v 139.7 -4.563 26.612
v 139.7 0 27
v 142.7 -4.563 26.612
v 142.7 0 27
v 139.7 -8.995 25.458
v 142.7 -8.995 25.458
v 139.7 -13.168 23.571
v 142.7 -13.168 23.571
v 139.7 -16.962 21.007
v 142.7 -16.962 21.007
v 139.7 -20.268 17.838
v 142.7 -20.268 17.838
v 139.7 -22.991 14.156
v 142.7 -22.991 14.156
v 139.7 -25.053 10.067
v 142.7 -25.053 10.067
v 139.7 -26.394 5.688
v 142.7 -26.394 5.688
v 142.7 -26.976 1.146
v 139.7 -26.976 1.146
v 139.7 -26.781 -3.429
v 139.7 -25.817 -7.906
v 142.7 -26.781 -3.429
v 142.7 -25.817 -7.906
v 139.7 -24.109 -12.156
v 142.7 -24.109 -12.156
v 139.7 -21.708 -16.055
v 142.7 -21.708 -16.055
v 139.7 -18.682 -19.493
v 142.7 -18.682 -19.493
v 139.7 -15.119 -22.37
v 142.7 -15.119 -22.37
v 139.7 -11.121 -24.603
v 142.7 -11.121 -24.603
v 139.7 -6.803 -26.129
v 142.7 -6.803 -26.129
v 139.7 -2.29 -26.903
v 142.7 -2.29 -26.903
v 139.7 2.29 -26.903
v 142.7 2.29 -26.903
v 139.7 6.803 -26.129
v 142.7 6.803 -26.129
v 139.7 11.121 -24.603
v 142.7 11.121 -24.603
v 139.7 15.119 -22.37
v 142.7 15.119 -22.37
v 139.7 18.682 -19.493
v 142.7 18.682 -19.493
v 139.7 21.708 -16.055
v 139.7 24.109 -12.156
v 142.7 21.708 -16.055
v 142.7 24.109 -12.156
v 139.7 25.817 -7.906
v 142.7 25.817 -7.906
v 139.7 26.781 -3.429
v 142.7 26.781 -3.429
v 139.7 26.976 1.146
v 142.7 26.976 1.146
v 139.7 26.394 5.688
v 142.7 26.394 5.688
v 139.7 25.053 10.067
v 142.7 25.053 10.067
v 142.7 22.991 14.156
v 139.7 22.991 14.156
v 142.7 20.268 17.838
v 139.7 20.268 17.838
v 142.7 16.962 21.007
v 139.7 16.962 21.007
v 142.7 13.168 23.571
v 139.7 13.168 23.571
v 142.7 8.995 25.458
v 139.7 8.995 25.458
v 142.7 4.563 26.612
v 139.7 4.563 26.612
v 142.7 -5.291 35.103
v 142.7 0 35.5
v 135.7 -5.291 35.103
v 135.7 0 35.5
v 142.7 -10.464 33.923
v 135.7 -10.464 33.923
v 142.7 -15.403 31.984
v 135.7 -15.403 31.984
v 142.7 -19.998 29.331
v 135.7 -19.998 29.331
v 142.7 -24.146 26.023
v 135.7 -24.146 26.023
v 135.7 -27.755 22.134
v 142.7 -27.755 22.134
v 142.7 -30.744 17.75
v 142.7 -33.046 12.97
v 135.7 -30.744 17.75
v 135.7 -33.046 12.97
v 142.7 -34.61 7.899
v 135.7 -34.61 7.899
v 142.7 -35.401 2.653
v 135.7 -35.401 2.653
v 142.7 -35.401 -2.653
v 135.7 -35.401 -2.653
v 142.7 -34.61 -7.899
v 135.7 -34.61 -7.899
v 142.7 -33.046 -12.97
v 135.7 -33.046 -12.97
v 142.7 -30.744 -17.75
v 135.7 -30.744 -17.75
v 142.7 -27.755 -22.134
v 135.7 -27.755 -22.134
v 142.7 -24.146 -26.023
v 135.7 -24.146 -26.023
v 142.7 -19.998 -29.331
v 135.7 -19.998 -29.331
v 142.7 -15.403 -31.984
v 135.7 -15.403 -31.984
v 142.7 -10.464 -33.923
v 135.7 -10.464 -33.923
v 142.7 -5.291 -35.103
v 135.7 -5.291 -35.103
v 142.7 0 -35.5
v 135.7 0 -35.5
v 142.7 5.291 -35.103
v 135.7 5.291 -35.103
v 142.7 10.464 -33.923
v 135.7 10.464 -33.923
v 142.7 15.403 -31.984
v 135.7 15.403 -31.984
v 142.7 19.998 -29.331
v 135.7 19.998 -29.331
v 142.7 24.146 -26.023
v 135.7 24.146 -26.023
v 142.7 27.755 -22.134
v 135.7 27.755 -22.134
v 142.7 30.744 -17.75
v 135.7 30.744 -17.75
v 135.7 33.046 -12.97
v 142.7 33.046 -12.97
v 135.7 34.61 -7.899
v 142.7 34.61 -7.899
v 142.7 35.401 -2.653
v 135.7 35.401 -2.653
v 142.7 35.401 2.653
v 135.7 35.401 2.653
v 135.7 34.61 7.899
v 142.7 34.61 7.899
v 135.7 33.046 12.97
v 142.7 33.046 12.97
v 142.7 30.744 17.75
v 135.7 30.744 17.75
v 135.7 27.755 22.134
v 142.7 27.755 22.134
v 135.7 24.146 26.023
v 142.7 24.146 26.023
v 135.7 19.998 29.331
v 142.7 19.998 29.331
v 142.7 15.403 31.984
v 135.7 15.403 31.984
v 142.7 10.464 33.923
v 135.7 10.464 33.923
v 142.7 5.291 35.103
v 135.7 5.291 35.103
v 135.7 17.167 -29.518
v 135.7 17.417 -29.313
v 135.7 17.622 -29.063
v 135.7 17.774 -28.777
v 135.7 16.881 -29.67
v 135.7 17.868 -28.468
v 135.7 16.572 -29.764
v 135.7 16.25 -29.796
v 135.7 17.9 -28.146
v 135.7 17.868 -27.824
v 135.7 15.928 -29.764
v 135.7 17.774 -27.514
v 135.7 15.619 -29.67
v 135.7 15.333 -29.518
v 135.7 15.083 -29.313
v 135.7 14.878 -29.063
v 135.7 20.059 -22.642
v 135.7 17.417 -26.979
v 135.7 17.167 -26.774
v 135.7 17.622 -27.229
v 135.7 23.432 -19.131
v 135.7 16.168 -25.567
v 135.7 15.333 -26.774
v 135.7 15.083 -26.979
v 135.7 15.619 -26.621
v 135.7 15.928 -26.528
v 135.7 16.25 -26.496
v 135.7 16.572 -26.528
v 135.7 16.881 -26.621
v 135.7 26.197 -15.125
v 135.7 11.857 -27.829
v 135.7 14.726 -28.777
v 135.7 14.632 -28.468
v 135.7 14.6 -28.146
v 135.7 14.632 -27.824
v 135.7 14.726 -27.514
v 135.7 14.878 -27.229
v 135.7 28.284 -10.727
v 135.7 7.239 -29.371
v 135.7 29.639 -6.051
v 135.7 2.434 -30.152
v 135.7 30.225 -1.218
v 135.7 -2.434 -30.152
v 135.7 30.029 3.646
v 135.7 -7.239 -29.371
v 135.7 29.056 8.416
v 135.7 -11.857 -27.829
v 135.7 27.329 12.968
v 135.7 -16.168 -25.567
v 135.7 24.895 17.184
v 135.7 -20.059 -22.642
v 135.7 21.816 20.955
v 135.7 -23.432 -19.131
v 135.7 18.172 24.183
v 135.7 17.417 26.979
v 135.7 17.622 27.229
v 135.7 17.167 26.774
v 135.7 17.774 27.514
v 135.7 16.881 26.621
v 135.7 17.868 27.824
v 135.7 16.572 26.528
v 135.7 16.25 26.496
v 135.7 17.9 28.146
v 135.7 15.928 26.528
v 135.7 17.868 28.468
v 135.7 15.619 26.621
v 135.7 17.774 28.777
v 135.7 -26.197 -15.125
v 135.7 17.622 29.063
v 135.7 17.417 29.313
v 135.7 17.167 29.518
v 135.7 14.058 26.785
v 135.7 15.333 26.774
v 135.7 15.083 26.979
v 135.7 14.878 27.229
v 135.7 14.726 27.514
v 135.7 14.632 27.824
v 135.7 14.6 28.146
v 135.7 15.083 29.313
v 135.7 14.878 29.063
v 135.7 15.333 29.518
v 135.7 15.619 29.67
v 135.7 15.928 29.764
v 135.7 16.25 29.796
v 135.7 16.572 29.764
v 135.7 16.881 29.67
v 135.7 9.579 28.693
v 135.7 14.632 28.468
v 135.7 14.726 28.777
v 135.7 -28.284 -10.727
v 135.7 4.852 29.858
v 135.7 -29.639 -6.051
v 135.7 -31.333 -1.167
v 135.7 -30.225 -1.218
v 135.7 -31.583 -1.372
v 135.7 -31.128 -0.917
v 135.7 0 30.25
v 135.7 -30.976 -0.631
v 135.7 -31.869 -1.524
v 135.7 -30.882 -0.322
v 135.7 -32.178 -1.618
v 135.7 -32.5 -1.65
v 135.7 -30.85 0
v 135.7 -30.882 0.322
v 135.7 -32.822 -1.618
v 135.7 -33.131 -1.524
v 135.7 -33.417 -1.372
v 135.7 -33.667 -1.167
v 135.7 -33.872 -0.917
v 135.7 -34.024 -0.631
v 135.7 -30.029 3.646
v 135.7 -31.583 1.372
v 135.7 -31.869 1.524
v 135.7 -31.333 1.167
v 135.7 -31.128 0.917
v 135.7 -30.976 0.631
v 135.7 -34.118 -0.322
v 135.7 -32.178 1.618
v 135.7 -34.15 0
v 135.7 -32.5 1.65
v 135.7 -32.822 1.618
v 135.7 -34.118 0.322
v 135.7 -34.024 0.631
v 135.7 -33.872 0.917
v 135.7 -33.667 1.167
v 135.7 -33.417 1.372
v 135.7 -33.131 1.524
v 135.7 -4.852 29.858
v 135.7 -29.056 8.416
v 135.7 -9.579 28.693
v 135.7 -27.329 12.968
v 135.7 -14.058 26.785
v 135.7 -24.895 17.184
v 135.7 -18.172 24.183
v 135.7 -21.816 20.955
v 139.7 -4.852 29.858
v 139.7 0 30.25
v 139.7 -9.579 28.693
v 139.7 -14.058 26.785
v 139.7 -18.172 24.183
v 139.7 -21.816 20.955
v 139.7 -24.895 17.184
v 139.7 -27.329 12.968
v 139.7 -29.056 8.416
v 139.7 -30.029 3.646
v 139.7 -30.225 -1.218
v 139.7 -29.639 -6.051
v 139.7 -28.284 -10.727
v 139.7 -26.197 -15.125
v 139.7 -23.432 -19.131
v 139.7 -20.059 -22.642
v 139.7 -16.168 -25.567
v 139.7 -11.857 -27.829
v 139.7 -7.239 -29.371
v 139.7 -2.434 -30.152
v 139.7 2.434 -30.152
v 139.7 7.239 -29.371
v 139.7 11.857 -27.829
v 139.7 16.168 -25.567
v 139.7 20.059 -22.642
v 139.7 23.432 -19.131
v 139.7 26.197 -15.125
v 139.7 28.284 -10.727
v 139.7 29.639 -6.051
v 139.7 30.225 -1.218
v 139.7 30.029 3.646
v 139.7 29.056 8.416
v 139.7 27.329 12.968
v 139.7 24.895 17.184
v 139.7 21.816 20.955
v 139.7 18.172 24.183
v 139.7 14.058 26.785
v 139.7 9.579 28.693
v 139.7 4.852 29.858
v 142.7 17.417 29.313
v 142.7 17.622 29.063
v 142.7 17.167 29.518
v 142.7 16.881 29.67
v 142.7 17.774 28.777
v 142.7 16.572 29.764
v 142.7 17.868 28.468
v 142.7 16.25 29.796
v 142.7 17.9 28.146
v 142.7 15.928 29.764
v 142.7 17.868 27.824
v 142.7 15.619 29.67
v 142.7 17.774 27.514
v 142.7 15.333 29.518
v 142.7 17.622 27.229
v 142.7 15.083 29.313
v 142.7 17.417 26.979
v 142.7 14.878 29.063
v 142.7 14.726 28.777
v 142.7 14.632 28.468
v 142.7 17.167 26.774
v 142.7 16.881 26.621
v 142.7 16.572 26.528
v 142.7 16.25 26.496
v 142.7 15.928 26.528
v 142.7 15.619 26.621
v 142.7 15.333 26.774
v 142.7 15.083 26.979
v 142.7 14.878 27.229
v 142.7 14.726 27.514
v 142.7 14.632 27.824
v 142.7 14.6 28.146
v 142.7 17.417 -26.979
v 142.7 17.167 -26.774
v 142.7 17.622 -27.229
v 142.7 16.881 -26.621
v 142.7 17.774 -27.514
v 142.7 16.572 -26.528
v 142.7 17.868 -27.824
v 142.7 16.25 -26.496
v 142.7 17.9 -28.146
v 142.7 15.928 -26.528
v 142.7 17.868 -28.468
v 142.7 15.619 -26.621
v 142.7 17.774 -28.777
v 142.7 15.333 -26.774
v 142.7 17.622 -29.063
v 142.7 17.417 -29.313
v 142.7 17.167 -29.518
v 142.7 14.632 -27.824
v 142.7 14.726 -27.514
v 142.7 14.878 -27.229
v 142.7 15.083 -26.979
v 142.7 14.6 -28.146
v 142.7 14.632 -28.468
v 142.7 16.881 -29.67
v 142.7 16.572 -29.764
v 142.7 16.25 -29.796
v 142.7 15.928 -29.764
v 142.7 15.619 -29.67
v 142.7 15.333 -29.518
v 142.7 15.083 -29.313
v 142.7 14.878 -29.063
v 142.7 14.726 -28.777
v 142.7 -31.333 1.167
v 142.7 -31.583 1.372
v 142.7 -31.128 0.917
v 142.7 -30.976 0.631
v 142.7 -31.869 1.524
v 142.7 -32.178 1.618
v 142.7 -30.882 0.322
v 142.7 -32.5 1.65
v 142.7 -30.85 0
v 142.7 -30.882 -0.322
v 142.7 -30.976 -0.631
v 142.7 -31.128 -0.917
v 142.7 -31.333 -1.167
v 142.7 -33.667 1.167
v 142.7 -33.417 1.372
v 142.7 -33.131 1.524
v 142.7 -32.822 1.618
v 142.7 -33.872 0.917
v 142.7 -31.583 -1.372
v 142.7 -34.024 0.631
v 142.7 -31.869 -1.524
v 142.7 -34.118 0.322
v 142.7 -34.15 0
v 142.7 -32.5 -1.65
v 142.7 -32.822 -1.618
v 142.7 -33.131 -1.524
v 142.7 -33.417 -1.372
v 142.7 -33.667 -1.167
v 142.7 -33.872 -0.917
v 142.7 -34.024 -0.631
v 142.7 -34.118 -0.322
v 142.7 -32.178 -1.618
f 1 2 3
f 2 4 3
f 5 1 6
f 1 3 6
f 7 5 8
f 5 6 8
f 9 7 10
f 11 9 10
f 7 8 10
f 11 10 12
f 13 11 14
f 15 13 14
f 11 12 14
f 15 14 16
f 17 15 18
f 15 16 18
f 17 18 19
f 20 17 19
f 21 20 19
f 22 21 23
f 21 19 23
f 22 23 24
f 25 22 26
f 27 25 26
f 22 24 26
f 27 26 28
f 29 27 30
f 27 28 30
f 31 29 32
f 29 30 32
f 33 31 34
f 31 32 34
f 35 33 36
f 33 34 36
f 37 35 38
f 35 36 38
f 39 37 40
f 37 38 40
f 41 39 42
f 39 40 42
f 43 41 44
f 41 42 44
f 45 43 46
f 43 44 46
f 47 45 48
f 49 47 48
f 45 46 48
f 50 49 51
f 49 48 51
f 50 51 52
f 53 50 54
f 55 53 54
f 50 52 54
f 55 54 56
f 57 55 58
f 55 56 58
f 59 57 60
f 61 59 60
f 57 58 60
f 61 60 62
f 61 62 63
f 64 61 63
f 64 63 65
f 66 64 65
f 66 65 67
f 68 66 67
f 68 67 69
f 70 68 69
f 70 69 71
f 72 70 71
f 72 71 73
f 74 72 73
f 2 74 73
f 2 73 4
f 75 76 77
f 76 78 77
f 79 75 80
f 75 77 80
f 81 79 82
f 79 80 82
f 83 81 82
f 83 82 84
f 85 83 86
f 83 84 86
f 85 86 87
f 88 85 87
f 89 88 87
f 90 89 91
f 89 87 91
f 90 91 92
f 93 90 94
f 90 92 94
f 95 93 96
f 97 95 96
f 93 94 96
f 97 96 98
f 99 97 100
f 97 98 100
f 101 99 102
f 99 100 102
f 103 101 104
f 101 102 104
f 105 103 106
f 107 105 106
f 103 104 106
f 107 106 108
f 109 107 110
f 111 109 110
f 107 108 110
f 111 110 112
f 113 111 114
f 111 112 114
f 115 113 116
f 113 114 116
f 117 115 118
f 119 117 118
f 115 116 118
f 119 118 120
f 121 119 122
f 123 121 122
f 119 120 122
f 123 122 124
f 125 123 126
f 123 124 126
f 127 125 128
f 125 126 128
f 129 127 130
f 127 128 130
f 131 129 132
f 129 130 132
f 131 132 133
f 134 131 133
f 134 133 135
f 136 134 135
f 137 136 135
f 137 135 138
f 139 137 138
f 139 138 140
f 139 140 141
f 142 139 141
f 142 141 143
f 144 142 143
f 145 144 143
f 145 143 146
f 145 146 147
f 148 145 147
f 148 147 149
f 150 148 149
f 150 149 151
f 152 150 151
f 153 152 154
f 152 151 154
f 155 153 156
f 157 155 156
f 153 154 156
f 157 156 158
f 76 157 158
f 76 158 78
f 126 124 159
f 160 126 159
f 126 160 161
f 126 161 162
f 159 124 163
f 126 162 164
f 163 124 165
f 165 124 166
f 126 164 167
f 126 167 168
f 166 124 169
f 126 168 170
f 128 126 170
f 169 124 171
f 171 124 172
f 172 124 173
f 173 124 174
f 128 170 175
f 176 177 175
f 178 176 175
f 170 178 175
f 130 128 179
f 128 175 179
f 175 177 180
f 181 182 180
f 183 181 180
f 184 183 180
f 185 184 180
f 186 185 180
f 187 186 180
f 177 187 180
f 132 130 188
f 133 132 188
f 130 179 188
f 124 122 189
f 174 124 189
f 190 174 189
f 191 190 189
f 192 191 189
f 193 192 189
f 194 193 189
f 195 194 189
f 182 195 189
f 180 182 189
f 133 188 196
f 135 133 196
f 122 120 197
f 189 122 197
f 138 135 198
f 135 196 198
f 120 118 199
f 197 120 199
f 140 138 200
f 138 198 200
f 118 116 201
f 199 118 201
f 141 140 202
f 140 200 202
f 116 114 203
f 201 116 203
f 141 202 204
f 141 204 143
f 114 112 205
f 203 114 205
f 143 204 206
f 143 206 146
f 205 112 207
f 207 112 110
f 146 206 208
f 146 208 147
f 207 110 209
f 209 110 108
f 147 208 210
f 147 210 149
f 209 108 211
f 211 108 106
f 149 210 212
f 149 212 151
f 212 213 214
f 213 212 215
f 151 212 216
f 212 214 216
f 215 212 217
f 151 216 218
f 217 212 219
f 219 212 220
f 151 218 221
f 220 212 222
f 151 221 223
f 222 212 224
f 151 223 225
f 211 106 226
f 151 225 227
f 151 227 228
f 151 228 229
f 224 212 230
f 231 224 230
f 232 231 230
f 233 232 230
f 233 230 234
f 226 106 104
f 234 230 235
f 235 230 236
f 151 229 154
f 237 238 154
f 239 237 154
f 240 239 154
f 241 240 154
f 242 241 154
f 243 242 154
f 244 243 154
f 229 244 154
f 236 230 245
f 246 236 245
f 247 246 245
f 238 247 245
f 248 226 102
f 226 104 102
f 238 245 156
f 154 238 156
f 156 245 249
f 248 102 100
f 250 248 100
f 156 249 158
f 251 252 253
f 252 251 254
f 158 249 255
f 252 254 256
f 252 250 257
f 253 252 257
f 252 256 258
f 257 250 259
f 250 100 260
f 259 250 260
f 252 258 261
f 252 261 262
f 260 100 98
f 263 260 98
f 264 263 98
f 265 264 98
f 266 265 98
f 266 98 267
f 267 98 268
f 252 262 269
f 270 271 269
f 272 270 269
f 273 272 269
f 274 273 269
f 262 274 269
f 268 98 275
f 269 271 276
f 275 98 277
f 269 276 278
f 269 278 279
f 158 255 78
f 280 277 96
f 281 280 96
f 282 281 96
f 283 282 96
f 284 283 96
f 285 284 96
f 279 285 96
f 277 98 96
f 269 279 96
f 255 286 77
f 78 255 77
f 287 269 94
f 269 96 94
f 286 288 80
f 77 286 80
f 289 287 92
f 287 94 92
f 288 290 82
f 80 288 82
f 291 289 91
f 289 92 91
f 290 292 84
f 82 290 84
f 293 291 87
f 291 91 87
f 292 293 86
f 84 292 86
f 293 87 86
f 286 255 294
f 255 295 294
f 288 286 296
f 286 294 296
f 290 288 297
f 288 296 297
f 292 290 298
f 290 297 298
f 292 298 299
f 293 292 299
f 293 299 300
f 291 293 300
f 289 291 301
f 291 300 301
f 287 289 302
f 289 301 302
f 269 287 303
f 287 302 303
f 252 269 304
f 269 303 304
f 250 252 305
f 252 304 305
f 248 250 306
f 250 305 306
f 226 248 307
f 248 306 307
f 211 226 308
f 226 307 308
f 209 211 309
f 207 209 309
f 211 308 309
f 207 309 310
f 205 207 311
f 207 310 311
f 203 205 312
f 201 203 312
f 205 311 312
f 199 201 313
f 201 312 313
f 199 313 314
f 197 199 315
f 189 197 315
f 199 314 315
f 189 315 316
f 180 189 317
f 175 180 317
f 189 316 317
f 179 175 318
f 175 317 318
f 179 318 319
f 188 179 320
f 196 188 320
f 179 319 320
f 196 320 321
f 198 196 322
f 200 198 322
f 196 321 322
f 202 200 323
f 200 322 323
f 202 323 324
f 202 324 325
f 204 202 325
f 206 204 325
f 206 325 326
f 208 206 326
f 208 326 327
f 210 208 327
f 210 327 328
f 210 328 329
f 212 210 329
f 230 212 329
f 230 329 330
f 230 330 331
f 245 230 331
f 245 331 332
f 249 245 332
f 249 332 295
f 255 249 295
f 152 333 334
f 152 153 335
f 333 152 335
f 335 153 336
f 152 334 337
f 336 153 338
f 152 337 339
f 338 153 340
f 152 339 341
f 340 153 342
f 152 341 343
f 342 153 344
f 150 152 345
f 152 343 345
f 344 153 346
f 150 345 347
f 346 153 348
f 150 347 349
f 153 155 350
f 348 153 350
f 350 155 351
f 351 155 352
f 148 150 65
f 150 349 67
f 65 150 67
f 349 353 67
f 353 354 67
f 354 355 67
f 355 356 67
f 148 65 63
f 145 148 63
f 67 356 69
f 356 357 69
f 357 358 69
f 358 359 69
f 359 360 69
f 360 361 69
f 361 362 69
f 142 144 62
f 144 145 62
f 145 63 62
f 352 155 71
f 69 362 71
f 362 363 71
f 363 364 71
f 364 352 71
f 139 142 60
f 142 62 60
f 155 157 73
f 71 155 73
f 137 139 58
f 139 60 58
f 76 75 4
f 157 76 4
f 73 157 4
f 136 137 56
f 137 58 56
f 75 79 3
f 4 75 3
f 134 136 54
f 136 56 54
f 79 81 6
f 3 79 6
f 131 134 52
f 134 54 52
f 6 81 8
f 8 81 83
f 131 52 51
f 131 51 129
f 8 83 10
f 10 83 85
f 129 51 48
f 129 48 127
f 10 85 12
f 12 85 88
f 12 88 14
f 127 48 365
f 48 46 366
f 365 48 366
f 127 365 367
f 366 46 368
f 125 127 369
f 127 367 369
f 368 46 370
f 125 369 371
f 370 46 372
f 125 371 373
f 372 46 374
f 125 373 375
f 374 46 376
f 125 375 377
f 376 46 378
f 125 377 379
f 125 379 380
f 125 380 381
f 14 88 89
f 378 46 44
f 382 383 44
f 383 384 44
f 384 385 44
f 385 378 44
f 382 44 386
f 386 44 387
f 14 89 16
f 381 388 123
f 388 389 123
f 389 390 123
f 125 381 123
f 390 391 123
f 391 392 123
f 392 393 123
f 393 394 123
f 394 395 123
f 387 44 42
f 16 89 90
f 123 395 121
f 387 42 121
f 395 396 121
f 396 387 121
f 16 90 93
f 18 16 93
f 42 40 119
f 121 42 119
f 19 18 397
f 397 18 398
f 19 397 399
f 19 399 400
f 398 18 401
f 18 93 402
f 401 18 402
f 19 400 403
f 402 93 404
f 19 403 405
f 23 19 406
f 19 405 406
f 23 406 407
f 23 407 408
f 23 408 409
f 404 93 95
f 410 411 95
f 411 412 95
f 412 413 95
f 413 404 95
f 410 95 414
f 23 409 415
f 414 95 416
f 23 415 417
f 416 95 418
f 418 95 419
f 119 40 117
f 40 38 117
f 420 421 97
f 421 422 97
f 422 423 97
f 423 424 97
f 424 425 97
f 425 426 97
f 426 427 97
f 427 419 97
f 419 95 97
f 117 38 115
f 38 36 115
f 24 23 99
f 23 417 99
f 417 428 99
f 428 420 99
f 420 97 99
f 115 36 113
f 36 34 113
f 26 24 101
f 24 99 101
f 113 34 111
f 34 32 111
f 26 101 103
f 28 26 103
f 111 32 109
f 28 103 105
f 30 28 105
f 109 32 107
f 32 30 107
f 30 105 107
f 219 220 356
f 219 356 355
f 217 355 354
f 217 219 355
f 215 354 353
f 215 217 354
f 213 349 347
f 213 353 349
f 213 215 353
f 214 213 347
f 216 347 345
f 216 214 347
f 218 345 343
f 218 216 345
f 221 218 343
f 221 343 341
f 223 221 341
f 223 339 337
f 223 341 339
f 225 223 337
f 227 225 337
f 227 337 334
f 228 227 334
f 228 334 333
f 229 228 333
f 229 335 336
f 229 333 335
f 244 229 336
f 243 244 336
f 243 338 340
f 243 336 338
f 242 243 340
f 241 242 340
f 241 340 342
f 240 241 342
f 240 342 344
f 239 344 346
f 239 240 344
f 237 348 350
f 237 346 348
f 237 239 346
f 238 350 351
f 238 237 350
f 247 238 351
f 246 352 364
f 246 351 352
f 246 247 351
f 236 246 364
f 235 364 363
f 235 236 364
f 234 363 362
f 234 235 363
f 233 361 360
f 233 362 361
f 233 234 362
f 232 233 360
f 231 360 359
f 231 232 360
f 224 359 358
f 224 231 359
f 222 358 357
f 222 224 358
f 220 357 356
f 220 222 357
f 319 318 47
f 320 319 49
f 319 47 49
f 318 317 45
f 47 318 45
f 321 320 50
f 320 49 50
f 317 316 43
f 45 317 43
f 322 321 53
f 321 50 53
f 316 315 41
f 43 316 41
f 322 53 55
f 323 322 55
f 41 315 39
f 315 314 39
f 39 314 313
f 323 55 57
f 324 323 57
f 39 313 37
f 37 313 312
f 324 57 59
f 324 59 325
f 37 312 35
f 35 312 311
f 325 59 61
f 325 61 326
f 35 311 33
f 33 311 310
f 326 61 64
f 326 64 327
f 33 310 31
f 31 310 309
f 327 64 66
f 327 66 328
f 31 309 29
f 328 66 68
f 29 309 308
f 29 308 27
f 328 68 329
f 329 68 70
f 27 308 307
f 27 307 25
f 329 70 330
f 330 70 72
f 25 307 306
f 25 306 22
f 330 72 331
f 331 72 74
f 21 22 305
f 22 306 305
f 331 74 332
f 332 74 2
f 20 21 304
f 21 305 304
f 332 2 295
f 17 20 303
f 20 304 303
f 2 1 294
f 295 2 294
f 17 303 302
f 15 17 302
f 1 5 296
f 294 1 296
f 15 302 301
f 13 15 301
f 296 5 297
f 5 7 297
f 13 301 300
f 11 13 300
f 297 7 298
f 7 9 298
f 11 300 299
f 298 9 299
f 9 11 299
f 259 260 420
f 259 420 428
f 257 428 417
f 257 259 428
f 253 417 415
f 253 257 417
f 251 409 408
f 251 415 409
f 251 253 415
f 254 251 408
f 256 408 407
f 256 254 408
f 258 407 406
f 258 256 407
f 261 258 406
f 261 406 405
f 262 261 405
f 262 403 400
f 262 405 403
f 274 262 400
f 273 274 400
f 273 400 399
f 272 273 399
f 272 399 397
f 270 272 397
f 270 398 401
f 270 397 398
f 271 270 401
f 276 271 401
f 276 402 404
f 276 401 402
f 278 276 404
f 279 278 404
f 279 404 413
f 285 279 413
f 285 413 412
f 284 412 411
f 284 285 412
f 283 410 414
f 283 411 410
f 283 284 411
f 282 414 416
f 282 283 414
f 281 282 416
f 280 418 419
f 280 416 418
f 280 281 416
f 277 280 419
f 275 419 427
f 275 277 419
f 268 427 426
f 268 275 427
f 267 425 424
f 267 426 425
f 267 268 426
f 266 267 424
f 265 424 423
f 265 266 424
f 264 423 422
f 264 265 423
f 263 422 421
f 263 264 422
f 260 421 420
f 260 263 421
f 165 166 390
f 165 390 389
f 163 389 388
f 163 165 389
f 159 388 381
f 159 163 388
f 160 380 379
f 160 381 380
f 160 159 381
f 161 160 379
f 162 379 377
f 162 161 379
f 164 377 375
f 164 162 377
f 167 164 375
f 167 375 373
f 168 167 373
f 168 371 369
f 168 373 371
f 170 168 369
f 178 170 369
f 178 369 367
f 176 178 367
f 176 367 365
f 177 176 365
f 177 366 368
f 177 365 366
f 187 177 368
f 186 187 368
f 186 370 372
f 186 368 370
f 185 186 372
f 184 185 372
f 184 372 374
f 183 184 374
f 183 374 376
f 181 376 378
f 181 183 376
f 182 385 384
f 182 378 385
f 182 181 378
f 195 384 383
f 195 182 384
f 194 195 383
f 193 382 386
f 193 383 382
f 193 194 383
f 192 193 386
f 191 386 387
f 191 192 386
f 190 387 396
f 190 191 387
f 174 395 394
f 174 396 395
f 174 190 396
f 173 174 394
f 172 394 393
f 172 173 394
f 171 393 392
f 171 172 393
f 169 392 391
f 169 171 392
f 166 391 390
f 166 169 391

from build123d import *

# Parameters (mm, degrees)
AXIAL_HOLES_DEPTH      = 152.273890675
AXIAL_HOLES_DEPTH_BACK = 152.273890675
SKETCH2_R              = 1.65


with BuildPart() as part:
    # Axial profile (mm) → Full revolution (revolve)
    with BuildSketch(Plane.XY, mode=Mode.PRIVATE) as full_revolution_sk:
        Polygon((135.7, 30.25), (139.7, 30.25), (139.7, 27), (142.7, 27), (142.7, 35.5), (135.7, 35.5), align=None)
    revolve(full_revolution_sk.sketch.rotate(Axis((-110, 0, 0), (1, 0, 0)), 90), axis=Axis((-110, 0, 0), (1, 0, 0)))

    # Sketch2 → Axial holes (cut, two sides: drawn at the far end of the back side and taken through both)
    with BuildSketch(Plane(origin=(0, 0, 0), x_dir=(0, 0, -1), z_dir=(1, 0, 0)).offset(-AXIAL_HOLES_DEPTH_BACK)):
        with Locations((-28.145825623, 16.25)):
            Circle(SKETCH2_R)
        with Locations((0, -32.5)):
            Circle(SKETCH2_R)
        with Locations((28.145825623, 16.25)):
            Circle(SKETCH2_R)
    extrude(amount=AXIAL_HOLES_DEPTH + AXIAL_HOLES_DEPTH_BACK, mode=Mode.SUBTRACT)


solid = part.part
